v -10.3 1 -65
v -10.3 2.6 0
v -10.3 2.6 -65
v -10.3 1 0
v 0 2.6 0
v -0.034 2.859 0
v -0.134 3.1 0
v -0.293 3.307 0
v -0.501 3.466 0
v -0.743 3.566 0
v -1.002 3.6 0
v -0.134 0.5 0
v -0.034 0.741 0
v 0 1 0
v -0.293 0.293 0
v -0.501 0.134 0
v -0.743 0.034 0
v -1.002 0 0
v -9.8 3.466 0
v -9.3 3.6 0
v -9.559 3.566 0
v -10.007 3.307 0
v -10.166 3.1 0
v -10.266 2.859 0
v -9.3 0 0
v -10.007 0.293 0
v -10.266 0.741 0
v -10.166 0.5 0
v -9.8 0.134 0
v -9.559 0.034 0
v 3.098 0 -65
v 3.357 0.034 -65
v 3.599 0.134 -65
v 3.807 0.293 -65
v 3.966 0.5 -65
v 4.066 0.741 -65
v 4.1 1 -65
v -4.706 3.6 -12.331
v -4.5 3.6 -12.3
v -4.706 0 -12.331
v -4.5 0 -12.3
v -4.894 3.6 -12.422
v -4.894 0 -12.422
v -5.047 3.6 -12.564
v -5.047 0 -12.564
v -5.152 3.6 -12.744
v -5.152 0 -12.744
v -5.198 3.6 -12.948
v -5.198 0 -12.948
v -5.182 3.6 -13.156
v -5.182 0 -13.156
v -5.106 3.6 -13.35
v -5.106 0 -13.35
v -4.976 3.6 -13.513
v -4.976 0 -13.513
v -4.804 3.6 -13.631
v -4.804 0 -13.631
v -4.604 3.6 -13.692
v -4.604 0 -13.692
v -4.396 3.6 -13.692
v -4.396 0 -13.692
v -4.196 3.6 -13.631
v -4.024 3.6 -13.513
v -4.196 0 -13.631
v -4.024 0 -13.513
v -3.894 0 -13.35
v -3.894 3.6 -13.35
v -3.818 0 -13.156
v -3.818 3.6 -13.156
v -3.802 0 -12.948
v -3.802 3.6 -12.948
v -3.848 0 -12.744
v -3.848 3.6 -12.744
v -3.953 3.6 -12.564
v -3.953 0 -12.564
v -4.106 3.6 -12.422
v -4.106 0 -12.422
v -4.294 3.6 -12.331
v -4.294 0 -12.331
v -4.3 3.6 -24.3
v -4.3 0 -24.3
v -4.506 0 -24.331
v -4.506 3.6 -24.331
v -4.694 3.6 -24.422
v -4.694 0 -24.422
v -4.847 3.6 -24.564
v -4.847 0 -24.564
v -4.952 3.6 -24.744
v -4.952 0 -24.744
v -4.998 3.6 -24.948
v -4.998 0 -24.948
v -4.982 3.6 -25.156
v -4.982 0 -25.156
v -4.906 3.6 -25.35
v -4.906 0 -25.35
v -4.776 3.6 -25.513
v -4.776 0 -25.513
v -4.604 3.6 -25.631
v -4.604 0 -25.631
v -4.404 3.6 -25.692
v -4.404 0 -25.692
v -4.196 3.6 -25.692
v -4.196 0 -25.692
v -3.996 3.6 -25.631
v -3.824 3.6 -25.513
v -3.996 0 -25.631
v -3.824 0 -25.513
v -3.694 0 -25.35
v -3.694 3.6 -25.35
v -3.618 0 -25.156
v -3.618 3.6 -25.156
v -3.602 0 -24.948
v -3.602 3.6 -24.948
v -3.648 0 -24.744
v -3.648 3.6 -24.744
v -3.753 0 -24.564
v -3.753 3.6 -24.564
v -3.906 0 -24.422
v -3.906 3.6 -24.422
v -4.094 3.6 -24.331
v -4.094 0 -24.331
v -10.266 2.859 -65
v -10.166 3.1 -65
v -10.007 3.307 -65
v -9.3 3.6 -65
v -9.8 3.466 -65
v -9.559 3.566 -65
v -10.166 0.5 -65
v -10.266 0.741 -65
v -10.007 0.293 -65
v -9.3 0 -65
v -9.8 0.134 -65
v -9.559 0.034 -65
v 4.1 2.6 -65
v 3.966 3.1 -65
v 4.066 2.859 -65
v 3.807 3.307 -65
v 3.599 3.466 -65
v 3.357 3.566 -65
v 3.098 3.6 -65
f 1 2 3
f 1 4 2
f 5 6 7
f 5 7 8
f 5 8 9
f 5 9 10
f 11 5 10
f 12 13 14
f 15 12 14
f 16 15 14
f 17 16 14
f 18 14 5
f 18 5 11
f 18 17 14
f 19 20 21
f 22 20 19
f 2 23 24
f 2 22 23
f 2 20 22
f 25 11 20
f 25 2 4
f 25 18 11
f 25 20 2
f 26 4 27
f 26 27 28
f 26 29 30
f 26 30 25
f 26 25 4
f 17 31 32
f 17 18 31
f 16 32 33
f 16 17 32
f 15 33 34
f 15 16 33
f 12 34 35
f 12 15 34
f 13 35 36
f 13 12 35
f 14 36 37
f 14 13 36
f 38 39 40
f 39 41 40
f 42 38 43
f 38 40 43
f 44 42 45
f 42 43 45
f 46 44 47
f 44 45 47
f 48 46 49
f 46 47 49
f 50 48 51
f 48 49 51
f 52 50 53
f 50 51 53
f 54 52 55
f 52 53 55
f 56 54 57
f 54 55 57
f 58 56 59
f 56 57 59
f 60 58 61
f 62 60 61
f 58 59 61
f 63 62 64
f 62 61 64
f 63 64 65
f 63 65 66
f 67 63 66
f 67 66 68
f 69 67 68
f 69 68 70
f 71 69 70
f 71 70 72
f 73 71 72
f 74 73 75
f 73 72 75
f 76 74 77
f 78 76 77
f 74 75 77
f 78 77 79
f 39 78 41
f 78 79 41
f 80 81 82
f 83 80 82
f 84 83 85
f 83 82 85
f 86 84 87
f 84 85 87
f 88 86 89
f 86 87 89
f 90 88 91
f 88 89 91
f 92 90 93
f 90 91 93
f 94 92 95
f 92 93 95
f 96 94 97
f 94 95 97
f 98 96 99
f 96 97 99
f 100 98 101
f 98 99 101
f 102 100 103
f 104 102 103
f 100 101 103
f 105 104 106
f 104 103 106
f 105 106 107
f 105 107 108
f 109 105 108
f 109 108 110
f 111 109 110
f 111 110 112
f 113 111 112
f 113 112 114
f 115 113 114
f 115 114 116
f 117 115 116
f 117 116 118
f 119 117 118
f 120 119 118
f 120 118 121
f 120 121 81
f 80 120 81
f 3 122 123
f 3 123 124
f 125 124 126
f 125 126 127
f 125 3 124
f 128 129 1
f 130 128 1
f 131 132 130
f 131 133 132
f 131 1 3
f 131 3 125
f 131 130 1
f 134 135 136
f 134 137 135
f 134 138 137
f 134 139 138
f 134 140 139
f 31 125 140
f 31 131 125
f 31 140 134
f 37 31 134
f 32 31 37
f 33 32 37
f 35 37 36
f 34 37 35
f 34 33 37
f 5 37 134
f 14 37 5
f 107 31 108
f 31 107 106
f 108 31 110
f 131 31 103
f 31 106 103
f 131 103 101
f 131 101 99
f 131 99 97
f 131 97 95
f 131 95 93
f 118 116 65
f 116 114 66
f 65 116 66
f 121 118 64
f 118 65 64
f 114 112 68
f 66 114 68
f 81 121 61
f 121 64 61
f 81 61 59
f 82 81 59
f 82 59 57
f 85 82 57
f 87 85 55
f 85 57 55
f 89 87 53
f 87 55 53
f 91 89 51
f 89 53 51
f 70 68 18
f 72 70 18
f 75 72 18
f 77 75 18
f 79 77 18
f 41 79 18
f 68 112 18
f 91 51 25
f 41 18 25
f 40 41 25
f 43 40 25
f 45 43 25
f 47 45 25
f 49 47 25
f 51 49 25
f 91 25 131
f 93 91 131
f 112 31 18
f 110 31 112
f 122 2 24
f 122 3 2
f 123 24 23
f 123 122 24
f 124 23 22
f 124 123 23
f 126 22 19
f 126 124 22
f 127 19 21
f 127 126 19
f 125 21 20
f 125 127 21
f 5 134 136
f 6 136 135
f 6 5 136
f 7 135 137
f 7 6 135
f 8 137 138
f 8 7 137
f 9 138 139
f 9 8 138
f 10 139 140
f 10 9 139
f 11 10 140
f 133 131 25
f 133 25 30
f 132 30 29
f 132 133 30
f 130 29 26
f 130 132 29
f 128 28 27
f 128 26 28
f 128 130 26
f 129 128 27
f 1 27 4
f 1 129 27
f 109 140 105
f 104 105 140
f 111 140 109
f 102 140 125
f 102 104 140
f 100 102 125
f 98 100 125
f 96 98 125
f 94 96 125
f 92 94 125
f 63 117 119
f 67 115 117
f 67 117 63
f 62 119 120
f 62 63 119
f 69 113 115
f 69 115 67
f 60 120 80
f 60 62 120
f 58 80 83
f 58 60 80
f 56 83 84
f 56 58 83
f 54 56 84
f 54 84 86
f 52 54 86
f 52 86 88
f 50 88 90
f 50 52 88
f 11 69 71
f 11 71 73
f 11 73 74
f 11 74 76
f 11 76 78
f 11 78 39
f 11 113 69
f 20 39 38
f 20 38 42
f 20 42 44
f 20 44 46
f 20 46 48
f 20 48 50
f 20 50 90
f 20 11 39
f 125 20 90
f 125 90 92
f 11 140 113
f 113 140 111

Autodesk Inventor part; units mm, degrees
ref_plane "YZ Plane" through (0, 0, 0) normal (1, 0, 0) x (0, 1, 0)
ref_plane "XZ Plane" through (0, 0, 0) normal (0, 1, 0) x (-1, 0, 0)
ref_plane "XY Plane" through (0, 0, 0) normal (0, 0, 1) x (1, 0, 0)
sketch "Skizze1" plane through (0, 0, 0) normal (0, 1, 0) x (-1, 0, 0)
  line L0 (0, 0) -> (10.3, 0)
  line L1 (10.3, 0) -> (10.3, -65)
  line L2 (10.3, -65) -> (-4.1, -65)
  line L3 (-4.1, -65) -> (0, 0)
  dimension "d0" = 65
  dimension "d1" = 14.4
  dimension "d2" = 10.3
extrude "Extrusion1" add sketch "Skizze1" along normal blind 3.6
sketch "Skizze2" plane through (0, 3.6, 0) normal (0, 1, 0) x (1, 0, 0)
  line L0 (-10.3, 65) -> (-10.3, 0) projected
  line L1 (-10.3, 0) -> (-10.3, 13)
  line L2 (-10.3, 0) -> (-10.3, 25)
  line L3 (-10.3, 13) -> (-4.5, 13)
  line L4 (-10.3, 25) -> (-4.3, 25)
  point P0 (0, 0)
  dimension "d5" = 13
  dimension "d6" = 25
  dimension "d7" = 5.8
  dimension "d8" = 6
hole "Bohrung1" at (-4.5, 3.6, -13) at (-4.3, 3.6, -25) direction (0, -1, 0) diameter 1.4 end through all
fillet "Rundung1" radius 1 4 edges at (-10.3, 3.6, -32.5) (-10.3, 0, -32.5) (2.05, 3.6, -32.5) (2.05, 0, -32.5)
properties part number "Brillenbuegel"
